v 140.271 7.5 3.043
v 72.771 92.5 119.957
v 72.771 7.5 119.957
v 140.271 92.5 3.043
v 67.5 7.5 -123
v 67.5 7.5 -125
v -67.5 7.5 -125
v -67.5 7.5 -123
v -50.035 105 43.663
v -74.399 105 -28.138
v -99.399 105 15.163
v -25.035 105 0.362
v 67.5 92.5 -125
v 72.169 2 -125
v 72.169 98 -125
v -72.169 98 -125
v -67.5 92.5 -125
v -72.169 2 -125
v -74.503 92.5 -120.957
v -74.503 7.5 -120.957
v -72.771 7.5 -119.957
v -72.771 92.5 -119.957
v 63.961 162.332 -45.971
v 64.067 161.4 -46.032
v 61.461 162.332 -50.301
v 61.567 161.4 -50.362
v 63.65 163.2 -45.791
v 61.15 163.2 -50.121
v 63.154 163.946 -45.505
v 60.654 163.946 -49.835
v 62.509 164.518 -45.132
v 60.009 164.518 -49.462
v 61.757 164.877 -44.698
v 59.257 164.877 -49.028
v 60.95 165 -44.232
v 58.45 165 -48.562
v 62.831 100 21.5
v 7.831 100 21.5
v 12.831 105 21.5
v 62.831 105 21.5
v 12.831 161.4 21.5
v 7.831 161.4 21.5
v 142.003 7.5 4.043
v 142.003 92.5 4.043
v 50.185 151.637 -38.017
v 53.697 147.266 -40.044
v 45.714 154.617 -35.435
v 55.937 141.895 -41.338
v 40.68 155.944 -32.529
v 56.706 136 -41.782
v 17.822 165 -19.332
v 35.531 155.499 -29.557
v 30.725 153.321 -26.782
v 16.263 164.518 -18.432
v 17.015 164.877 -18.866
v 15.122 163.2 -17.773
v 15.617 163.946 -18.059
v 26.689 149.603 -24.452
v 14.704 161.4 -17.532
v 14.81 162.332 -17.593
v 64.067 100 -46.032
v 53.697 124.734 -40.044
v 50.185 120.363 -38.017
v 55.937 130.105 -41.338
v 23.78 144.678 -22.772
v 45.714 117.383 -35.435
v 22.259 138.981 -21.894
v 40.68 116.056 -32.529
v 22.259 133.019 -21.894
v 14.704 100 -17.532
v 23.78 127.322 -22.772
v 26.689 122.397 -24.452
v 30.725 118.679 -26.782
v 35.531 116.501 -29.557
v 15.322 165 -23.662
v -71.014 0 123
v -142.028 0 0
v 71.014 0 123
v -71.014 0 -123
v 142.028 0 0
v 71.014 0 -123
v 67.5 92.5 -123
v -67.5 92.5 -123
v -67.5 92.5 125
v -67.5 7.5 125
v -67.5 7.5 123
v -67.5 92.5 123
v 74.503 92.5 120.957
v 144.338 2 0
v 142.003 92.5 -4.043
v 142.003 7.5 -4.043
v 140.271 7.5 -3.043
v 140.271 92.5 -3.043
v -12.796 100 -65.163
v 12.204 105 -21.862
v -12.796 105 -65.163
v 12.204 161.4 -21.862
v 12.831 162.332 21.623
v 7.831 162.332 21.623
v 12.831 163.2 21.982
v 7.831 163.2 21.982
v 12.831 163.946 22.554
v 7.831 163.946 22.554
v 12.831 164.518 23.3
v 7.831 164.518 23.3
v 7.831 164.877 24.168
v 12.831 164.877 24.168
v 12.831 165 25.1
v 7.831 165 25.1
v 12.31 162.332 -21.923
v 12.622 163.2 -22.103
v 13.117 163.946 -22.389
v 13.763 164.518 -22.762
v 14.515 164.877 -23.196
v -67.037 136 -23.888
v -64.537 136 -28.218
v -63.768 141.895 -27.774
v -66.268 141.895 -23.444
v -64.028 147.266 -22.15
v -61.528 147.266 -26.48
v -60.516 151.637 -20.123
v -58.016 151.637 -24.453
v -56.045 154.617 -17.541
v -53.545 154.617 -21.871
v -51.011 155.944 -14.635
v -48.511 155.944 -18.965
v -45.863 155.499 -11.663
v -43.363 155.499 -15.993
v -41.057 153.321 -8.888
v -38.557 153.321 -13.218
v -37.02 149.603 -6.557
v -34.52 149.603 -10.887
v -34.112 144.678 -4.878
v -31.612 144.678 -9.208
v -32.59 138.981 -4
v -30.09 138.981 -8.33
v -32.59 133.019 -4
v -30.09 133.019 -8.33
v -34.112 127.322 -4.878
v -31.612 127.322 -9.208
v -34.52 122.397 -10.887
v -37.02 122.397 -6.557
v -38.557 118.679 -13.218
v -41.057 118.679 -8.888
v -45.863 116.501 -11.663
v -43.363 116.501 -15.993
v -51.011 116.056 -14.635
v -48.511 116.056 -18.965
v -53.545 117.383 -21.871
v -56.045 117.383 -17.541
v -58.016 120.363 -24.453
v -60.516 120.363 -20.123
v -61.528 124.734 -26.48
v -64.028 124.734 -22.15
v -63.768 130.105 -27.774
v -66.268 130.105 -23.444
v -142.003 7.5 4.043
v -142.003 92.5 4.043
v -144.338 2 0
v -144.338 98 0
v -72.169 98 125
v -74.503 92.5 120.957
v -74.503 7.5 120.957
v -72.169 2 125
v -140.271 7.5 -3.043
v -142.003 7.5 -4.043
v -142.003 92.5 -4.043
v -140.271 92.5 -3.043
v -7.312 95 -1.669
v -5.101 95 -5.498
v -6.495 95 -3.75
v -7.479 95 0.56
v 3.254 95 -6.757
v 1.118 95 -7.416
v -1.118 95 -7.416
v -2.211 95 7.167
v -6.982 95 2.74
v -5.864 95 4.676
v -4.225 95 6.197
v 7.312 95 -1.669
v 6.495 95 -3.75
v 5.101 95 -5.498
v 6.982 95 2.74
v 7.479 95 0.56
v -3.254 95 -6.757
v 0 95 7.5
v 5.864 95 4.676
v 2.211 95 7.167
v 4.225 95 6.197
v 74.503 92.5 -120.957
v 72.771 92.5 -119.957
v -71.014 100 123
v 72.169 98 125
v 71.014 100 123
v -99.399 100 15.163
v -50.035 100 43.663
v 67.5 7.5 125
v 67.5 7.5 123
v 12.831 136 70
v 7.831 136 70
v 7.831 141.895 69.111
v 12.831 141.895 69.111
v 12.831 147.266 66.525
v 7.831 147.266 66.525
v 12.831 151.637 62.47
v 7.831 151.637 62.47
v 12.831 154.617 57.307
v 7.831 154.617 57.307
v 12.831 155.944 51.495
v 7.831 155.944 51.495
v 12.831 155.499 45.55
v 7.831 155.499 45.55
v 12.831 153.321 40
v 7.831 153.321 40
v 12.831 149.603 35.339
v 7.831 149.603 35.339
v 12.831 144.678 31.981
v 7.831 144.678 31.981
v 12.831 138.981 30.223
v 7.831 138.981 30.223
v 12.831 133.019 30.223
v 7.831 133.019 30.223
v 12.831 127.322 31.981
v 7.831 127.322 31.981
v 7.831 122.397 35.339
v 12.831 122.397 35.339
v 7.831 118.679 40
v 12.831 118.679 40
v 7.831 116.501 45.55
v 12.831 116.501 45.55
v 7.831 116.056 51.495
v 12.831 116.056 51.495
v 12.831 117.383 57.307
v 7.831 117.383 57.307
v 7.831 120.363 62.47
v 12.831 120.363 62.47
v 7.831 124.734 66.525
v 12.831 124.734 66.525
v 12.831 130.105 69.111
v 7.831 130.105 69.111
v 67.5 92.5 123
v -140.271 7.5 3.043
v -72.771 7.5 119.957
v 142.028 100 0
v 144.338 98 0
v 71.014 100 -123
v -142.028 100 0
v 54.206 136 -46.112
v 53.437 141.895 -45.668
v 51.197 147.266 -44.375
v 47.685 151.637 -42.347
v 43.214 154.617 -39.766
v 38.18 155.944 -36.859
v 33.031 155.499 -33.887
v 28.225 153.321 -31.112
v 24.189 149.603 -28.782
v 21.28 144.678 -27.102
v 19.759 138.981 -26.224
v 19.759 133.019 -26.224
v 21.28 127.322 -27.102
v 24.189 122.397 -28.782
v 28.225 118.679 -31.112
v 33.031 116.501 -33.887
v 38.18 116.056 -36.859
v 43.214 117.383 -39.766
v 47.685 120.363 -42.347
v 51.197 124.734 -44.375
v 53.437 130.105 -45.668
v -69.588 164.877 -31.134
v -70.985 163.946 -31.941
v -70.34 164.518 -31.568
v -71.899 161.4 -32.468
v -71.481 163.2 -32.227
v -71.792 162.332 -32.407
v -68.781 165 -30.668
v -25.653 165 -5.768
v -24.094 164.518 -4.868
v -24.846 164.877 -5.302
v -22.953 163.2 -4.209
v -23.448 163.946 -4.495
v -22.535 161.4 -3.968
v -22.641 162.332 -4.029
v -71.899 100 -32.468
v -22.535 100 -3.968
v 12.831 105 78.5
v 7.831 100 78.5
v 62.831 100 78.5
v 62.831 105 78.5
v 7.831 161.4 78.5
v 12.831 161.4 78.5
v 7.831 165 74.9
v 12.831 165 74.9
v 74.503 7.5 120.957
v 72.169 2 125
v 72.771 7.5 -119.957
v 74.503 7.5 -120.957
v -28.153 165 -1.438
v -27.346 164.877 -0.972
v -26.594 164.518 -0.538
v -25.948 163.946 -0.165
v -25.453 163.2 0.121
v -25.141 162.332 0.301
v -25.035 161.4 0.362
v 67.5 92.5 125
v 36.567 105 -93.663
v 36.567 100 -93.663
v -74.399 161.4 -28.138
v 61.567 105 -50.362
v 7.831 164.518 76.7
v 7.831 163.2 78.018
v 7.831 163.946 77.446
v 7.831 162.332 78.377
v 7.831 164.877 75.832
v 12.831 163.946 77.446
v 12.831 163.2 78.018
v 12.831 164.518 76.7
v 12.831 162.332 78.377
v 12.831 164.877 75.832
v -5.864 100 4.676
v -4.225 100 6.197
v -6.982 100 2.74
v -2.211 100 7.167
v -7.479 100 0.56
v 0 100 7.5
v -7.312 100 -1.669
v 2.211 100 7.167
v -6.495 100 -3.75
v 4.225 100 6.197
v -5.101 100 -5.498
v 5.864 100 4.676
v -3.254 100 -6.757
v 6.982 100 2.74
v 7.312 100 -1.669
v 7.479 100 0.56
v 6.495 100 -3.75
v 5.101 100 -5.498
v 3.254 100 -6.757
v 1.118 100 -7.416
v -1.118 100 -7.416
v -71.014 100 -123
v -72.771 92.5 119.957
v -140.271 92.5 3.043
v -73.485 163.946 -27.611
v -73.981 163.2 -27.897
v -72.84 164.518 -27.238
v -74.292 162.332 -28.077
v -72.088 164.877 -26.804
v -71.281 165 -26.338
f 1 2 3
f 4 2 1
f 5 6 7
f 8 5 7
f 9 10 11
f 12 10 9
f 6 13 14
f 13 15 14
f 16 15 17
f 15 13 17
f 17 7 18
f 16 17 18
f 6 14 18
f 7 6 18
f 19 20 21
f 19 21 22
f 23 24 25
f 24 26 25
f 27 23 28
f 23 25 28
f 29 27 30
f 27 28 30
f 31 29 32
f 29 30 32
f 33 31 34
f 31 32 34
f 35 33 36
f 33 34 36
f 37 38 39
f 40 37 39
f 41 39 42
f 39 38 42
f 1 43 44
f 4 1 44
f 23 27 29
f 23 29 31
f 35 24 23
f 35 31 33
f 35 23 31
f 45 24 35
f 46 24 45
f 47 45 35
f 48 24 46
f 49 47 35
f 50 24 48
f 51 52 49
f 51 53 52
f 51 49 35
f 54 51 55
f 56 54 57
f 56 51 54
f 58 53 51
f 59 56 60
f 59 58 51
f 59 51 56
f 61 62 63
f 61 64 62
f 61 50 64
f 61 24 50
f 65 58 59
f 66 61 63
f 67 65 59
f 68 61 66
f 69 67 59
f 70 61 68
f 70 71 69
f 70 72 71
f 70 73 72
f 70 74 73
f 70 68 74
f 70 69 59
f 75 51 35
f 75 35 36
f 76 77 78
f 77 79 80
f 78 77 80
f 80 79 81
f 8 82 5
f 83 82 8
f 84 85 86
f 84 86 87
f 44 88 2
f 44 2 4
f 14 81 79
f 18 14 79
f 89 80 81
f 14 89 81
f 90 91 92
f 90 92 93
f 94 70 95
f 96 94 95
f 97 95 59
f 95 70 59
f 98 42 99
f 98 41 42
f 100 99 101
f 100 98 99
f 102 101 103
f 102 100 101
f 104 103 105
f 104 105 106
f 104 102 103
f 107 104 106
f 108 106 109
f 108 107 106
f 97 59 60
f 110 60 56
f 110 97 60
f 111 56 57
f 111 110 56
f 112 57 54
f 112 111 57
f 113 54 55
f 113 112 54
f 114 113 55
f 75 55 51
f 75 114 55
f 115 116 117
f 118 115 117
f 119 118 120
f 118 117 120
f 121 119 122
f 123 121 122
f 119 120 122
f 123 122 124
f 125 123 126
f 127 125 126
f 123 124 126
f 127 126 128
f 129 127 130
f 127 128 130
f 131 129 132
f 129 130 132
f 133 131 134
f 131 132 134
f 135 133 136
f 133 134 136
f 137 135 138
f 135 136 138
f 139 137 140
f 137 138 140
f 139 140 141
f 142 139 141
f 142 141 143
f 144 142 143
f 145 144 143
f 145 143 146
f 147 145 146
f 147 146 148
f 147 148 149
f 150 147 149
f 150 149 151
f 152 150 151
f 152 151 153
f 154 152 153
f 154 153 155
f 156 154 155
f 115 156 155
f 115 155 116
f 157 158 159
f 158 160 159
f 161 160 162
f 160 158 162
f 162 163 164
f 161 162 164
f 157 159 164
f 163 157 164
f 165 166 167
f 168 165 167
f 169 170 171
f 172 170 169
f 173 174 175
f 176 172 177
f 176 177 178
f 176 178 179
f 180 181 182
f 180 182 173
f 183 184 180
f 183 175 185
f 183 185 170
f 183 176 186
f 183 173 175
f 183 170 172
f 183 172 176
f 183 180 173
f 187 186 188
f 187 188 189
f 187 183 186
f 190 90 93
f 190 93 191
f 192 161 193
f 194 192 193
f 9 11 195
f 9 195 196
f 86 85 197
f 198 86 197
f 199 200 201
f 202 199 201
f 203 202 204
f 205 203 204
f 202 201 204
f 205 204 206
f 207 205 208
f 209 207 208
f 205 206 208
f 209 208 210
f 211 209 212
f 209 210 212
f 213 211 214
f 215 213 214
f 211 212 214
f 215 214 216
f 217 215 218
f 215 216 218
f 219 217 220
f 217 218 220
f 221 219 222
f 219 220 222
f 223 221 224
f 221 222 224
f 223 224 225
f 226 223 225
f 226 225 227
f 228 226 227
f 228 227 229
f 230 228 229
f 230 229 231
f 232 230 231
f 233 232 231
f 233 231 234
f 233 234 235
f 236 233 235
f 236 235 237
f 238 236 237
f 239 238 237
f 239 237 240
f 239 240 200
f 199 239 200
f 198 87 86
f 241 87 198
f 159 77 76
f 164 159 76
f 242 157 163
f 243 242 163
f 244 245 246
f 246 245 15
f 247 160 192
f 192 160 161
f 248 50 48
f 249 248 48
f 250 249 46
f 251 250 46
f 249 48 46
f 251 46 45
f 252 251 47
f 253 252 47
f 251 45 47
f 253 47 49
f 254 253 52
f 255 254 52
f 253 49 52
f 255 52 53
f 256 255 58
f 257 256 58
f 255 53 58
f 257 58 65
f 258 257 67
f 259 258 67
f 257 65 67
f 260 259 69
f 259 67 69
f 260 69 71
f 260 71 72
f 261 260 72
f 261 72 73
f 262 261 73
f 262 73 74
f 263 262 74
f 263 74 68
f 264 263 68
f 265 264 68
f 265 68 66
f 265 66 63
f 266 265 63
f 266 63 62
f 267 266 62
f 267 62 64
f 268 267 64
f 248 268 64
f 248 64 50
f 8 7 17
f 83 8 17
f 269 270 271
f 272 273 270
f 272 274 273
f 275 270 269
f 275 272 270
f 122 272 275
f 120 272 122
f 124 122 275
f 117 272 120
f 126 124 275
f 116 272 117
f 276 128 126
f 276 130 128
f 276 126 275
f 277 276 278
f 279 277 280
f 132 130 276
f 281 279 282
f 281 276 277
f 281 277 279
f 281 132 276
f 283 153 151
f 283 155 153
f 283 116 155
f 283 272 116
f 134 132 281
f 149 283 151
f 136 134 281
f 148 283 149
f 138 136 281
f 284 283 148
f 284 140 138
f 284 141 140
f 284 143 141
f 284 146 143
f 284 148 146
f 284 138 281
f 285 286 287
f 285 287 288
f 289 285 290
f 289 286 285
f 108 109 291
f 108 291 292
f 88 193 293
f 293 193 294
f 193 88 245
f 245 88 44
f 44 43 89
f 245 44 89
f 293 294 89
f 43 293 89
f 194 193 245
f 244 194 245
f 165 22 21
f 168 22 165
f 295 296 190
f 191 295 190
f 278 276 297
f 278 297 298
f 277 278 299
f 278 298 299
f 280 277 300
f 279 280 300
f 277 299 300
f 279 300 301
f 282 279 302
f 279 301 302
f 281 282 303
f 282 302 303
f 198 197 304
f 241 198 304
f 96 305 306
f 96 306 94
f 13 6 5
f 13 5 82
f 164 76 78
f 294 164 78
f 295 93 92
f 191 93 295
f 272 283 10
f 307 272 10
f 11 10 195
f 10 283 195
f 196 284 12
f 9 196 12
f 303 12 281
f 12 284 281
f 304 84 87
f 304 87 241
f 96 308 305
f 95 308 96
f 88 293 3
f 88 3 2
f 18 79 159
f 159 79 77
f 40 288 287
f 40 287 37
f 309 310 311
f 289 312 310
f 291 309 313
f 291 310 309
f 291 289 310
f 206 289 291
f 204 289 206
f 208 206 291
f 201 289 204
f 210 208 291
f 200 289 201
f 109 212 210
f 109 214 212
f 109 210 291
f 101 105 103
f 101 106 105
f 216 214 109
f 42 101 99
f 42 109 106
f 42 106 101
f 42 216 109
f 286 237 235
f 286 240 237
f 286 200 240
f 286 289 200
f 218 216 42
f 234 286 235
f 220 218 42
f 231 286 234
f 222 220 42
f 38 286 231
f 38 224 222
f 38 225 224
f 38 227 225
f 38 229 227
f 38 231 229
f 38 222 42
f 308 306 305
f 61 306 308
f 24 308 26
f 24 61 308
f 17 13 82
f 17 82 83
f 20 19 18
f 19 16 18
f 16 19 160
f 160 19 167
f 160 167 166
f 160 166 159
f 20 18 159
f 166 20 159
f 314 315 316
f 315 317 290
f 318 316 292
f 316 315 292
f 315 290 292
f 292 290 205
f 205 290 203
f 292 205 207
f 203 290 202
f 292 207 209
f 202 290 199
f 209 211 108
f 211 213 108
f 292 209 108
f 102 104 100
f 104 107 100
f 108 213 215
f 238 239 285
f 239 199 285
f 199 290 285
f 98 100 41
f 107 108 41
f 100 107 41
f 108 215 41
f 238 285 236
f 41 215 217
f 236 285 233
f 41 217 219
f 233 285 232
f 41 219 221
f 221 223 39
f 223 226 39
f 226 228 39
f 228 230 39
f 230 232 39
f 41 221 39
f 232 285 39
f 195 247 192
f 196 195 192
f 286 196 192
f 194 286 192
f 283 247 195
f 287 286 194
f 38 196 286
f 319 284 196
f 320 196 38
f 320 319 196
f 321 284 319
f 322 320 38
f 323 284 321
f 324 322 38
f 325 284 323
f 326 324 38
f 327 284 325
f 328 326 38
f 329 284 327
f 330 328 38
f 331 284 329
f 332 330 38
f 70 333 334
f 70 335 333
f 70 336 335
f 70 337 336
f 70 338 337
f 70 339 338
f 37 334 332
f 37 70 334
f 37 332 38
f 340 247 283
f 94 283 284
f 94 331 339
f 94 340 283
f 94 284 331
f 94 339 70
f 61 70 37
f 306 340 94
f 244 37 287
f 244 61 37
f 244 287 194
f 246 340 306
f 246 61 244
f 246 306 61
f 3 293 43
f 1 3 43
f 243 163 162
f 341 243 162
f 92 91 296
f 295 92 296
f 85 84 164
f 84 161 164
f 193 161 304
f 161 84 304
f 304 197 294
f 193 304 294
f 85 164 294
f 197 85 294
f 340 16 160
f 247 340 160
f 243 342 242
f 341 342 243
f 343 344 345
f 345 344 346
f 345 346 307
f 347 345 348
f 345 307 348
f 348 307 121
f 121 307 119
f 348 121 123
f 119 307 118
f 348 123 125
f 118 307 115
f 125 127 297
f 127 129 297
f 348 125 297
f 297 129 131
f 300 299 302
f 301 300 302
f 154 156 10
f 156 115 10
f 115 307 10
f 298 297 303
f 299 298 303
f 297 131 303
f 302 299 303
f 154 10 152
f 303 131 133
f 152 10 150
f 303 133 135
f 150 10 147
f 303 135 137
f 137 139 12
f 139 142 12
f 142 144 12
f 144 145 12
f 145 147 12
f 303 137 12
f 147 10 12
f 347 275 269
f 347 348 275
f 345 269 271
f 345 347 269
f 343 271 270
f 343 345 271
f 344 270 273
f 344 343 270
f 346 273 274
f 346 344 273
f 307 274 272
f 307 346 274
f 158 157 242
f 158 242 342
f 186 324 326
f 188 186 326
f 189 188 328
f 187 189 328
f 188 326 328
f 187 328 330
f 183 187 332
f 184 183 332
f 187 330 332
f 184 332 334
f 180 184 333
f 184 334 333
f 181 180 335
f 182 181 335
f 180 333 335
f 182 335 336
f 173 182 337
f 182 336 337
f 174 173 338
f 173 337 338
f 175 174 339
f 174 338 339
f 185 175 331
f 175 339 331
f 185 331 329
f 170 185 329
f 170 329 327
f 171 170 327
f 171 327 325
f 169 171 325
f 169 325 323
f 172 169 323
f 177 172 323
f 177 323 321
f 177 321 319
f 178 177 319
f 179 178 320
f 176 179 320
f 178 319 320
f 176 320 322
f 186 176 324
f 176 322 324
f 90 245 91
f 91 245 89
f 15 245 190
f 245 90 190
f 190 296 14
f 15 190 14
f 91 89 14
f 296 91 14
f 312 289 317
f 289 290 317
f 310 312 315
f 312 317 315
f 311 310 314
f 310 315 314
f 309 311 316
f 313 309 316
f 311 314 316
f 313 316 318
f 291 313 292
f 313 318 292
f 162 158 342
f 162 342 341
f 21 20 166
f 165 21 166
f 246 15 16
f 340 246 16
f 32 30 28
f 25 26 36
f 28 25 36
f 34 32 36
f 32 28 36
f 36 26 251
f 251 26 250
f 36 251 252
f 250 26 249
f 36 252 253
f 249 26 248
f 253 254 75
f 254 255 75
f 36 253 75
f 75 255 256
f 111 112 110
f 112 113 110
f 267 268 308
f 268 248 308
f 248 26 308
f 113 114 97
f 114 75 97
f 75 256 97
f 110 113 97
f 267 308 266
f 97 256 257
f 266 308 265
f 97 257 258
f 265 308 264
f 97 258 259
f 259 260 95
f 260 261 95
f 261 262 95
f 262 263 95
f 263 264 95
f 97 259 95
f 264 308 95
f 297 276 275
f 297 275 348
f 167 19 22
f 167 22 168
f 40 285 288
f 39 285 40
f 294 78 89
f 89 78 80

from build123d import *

# Parameters (mm, degrees)
BOSS_EXTRUDE1_DEPTH      = 100
SKETCH2_W                = 5
SKETCH2_H                = 57
BOSS_EXTRUDE2_DEPTH      = 65
SKETCH3_R                = 20
CUT_EXTRUDE1_DEPTH       = 257.915041827
SKETCH7_W                = 57
SKETCH7_H                = 5
BOSS_EXTRUDE3_DEPTH      = 50
FILLET1_R                = 3.6
SKETCH6_W                = 135
SKETCH6_H                = 85
CUT_EXTRUDE2_DEPTH       = 2
CIRPATTERN1_COUNT        = 3
FILLET1_OF_CIRPATTERN1_R = 3.6
CIRPATTERN2_COUNT        = 6
CHAMFER1_SIZE            = 2
SKETCH8_R                = 7.5
CUT_EXTRUDE3_DEPTH       = 5


with BuildPart() as part:
    # Sketch1 → Boss-Extrude1 (new body)
    with BuildSketch(Plane(origin=(0, 0, 0), x_dir=(1, 0, 0), z_dir=(0, 1, 0))):
        Polygon((72.168783649, 125), (-72.168783649, 125), (-144.337567297, 0), (-72.168783649, -125), (72.168783649, -125), (144.337567297, 0), align=None)
    extrude(amount=BOSS_EXTRUDE1_DEPTH)

    # Sketch2 → Boss-Extrude2 (add)
    with BuildSketch(Plane(origin=(0, 100, 0), x_dir=(1, 0, 0), z_dir=(0, 1, 0))):
        with Locations((10.331216351, -50)):
            Rectangle(SKETCH2_W, SKETCH2_H)
    boss_extrude2 = extrude(amount=BOSS_EXTRUDE2_DEPTH)

    # Sketch3 → Cut-Extrude1 (cut, through all)
    with BuildSketch(Plane.ZY.offset(-7.831216351)):
        with Locations((50, 136)):
            Circle(SKETCH3_R)
    cut_extrude1 = extrude(amount=-CUT_EXTRUDE1_DEPTH, mode=Mode.SUBTRACT)

    # Sketch7 → Boss-Extrude3 (add)
    with BuildSketch(Plane(origin=(12.831216351, 0, 0), x_dir=(0, 0, -1), z_dir=(1, 0, 0))):
        with Locations((-50, 102.5)):
            Rectangle(SKETCH7_W, SKETCH7_H)
    boss_extrude3 = extrude(amount=BOSS_EXTRUDE3_DEPTH)

    # Fillet1
    fillet1_edges = [part.edges().sort_by_distance(p)[0] for p in [
        (10.331216351, 165, 21.5),
        (10.331216351, 165, 78.5),
    ]]
    fillet(fillet1_edges, radius=FILLET1_R)

    # Sketch6 → Cut-Extrude2 (cut)
    with BuildSketch(Plane.XY.offset(125)):
        with Locations((0, 50)):
            Rectangle(SKETCH6_W, SKETCH6_H)
    cut_extrude2 = extrude(amount=-CUT_EXTRUDE2_DEPTH, mode=Mode.SUBTRACT)

    # CirPattern1: Boss-Extrude2, Cut-Extrude1, Boss-Extrude3 ×3 about axis
    cirpattern1_axis = Axis((0, 0, 0), (0, 1, 0))
    add([boss_extrude2.rotate(cirpattern1_axis, i * 360 / CIRPATTERN1_COUNT) for i in range(1, CIRPATTERN1_COUNT)])
    add([cut_extrude1.rotate(cirpattern1_axis, i * 360 / CIRPATTERN1_COUNT) for i in range(1, CIRPATTERN1_COUNT)], mode=Mode.SUBTRACT)
    add([boss_extrude3.rotate(cirpattern1_axis, i * 360 / CIRPATTERN1_COUNT) for i in range(1, CIRPATTERN1_COUNT)])

    # Fillet1 of CirPattern1
    fillet1_of_cirpattern1_edges = [part.edges().sort_by_distance(p)[0] for p in [
        (13.453938006, 165, -19.697095812),
        (62.817386021, 165, -48.197095812),
        (-23.785154357, 165, -1.802904188),
        (-73.148602373, 165, -30.302904188),
    ]]
    fillet(fillet1_of_cirpattern1_edges, radius=FILLET1_OF_CIRPATTERN1_R)

    # CirPattern2: Cut-Extrude2 ×6 about axis
    cirpattern2_axis = Axis((0, 0, 0), (0, 1, 0))
    for i in range(1, CIRPATTERN2_COUNT):
        add(cut_extrude2.rotate(cirpattern2_axis, i * 360 / CIRPATTERN2_COUNT), mode=Mode.SUBTRACT)

    # Chamfer1
    chamfer1_edges = [part.edges().sort_by_distance(p)[0] for p in [
        (108.253175473, 0, -62.5),
        (0, 0, -125),
        (-108.253175473, 0, -62.5),
        (-108.253175473, 0, 62.5),
        (108.253175473, 0, 62.5),
        (0, 0, 125),
        (-108.253175473, 100, 62.5),
        (-108.253175473, 100, -62.5),
        (0, 100, -125),
        (108.253175473, 100, -62.5),
        (108.253175473, 100, 62.5),
        (0, 100, 125),
    ]]
    chamfer(chamfer1_edges, length=CHAMFER1_SIZE)

    # Sketch8 → Cut-Extrude3 (cut)
    with BuildSketch(Plane(origin=(0, 100, 0), x_dir=(1, 0, 0), z_dir=(0, 1, 0))):
        Circle(SKETCH8_R)
    extrude(amount=-CUT_EXTRUDE3_DEPTH, mode=Mode.SUBTRACT)


solid = part.part
